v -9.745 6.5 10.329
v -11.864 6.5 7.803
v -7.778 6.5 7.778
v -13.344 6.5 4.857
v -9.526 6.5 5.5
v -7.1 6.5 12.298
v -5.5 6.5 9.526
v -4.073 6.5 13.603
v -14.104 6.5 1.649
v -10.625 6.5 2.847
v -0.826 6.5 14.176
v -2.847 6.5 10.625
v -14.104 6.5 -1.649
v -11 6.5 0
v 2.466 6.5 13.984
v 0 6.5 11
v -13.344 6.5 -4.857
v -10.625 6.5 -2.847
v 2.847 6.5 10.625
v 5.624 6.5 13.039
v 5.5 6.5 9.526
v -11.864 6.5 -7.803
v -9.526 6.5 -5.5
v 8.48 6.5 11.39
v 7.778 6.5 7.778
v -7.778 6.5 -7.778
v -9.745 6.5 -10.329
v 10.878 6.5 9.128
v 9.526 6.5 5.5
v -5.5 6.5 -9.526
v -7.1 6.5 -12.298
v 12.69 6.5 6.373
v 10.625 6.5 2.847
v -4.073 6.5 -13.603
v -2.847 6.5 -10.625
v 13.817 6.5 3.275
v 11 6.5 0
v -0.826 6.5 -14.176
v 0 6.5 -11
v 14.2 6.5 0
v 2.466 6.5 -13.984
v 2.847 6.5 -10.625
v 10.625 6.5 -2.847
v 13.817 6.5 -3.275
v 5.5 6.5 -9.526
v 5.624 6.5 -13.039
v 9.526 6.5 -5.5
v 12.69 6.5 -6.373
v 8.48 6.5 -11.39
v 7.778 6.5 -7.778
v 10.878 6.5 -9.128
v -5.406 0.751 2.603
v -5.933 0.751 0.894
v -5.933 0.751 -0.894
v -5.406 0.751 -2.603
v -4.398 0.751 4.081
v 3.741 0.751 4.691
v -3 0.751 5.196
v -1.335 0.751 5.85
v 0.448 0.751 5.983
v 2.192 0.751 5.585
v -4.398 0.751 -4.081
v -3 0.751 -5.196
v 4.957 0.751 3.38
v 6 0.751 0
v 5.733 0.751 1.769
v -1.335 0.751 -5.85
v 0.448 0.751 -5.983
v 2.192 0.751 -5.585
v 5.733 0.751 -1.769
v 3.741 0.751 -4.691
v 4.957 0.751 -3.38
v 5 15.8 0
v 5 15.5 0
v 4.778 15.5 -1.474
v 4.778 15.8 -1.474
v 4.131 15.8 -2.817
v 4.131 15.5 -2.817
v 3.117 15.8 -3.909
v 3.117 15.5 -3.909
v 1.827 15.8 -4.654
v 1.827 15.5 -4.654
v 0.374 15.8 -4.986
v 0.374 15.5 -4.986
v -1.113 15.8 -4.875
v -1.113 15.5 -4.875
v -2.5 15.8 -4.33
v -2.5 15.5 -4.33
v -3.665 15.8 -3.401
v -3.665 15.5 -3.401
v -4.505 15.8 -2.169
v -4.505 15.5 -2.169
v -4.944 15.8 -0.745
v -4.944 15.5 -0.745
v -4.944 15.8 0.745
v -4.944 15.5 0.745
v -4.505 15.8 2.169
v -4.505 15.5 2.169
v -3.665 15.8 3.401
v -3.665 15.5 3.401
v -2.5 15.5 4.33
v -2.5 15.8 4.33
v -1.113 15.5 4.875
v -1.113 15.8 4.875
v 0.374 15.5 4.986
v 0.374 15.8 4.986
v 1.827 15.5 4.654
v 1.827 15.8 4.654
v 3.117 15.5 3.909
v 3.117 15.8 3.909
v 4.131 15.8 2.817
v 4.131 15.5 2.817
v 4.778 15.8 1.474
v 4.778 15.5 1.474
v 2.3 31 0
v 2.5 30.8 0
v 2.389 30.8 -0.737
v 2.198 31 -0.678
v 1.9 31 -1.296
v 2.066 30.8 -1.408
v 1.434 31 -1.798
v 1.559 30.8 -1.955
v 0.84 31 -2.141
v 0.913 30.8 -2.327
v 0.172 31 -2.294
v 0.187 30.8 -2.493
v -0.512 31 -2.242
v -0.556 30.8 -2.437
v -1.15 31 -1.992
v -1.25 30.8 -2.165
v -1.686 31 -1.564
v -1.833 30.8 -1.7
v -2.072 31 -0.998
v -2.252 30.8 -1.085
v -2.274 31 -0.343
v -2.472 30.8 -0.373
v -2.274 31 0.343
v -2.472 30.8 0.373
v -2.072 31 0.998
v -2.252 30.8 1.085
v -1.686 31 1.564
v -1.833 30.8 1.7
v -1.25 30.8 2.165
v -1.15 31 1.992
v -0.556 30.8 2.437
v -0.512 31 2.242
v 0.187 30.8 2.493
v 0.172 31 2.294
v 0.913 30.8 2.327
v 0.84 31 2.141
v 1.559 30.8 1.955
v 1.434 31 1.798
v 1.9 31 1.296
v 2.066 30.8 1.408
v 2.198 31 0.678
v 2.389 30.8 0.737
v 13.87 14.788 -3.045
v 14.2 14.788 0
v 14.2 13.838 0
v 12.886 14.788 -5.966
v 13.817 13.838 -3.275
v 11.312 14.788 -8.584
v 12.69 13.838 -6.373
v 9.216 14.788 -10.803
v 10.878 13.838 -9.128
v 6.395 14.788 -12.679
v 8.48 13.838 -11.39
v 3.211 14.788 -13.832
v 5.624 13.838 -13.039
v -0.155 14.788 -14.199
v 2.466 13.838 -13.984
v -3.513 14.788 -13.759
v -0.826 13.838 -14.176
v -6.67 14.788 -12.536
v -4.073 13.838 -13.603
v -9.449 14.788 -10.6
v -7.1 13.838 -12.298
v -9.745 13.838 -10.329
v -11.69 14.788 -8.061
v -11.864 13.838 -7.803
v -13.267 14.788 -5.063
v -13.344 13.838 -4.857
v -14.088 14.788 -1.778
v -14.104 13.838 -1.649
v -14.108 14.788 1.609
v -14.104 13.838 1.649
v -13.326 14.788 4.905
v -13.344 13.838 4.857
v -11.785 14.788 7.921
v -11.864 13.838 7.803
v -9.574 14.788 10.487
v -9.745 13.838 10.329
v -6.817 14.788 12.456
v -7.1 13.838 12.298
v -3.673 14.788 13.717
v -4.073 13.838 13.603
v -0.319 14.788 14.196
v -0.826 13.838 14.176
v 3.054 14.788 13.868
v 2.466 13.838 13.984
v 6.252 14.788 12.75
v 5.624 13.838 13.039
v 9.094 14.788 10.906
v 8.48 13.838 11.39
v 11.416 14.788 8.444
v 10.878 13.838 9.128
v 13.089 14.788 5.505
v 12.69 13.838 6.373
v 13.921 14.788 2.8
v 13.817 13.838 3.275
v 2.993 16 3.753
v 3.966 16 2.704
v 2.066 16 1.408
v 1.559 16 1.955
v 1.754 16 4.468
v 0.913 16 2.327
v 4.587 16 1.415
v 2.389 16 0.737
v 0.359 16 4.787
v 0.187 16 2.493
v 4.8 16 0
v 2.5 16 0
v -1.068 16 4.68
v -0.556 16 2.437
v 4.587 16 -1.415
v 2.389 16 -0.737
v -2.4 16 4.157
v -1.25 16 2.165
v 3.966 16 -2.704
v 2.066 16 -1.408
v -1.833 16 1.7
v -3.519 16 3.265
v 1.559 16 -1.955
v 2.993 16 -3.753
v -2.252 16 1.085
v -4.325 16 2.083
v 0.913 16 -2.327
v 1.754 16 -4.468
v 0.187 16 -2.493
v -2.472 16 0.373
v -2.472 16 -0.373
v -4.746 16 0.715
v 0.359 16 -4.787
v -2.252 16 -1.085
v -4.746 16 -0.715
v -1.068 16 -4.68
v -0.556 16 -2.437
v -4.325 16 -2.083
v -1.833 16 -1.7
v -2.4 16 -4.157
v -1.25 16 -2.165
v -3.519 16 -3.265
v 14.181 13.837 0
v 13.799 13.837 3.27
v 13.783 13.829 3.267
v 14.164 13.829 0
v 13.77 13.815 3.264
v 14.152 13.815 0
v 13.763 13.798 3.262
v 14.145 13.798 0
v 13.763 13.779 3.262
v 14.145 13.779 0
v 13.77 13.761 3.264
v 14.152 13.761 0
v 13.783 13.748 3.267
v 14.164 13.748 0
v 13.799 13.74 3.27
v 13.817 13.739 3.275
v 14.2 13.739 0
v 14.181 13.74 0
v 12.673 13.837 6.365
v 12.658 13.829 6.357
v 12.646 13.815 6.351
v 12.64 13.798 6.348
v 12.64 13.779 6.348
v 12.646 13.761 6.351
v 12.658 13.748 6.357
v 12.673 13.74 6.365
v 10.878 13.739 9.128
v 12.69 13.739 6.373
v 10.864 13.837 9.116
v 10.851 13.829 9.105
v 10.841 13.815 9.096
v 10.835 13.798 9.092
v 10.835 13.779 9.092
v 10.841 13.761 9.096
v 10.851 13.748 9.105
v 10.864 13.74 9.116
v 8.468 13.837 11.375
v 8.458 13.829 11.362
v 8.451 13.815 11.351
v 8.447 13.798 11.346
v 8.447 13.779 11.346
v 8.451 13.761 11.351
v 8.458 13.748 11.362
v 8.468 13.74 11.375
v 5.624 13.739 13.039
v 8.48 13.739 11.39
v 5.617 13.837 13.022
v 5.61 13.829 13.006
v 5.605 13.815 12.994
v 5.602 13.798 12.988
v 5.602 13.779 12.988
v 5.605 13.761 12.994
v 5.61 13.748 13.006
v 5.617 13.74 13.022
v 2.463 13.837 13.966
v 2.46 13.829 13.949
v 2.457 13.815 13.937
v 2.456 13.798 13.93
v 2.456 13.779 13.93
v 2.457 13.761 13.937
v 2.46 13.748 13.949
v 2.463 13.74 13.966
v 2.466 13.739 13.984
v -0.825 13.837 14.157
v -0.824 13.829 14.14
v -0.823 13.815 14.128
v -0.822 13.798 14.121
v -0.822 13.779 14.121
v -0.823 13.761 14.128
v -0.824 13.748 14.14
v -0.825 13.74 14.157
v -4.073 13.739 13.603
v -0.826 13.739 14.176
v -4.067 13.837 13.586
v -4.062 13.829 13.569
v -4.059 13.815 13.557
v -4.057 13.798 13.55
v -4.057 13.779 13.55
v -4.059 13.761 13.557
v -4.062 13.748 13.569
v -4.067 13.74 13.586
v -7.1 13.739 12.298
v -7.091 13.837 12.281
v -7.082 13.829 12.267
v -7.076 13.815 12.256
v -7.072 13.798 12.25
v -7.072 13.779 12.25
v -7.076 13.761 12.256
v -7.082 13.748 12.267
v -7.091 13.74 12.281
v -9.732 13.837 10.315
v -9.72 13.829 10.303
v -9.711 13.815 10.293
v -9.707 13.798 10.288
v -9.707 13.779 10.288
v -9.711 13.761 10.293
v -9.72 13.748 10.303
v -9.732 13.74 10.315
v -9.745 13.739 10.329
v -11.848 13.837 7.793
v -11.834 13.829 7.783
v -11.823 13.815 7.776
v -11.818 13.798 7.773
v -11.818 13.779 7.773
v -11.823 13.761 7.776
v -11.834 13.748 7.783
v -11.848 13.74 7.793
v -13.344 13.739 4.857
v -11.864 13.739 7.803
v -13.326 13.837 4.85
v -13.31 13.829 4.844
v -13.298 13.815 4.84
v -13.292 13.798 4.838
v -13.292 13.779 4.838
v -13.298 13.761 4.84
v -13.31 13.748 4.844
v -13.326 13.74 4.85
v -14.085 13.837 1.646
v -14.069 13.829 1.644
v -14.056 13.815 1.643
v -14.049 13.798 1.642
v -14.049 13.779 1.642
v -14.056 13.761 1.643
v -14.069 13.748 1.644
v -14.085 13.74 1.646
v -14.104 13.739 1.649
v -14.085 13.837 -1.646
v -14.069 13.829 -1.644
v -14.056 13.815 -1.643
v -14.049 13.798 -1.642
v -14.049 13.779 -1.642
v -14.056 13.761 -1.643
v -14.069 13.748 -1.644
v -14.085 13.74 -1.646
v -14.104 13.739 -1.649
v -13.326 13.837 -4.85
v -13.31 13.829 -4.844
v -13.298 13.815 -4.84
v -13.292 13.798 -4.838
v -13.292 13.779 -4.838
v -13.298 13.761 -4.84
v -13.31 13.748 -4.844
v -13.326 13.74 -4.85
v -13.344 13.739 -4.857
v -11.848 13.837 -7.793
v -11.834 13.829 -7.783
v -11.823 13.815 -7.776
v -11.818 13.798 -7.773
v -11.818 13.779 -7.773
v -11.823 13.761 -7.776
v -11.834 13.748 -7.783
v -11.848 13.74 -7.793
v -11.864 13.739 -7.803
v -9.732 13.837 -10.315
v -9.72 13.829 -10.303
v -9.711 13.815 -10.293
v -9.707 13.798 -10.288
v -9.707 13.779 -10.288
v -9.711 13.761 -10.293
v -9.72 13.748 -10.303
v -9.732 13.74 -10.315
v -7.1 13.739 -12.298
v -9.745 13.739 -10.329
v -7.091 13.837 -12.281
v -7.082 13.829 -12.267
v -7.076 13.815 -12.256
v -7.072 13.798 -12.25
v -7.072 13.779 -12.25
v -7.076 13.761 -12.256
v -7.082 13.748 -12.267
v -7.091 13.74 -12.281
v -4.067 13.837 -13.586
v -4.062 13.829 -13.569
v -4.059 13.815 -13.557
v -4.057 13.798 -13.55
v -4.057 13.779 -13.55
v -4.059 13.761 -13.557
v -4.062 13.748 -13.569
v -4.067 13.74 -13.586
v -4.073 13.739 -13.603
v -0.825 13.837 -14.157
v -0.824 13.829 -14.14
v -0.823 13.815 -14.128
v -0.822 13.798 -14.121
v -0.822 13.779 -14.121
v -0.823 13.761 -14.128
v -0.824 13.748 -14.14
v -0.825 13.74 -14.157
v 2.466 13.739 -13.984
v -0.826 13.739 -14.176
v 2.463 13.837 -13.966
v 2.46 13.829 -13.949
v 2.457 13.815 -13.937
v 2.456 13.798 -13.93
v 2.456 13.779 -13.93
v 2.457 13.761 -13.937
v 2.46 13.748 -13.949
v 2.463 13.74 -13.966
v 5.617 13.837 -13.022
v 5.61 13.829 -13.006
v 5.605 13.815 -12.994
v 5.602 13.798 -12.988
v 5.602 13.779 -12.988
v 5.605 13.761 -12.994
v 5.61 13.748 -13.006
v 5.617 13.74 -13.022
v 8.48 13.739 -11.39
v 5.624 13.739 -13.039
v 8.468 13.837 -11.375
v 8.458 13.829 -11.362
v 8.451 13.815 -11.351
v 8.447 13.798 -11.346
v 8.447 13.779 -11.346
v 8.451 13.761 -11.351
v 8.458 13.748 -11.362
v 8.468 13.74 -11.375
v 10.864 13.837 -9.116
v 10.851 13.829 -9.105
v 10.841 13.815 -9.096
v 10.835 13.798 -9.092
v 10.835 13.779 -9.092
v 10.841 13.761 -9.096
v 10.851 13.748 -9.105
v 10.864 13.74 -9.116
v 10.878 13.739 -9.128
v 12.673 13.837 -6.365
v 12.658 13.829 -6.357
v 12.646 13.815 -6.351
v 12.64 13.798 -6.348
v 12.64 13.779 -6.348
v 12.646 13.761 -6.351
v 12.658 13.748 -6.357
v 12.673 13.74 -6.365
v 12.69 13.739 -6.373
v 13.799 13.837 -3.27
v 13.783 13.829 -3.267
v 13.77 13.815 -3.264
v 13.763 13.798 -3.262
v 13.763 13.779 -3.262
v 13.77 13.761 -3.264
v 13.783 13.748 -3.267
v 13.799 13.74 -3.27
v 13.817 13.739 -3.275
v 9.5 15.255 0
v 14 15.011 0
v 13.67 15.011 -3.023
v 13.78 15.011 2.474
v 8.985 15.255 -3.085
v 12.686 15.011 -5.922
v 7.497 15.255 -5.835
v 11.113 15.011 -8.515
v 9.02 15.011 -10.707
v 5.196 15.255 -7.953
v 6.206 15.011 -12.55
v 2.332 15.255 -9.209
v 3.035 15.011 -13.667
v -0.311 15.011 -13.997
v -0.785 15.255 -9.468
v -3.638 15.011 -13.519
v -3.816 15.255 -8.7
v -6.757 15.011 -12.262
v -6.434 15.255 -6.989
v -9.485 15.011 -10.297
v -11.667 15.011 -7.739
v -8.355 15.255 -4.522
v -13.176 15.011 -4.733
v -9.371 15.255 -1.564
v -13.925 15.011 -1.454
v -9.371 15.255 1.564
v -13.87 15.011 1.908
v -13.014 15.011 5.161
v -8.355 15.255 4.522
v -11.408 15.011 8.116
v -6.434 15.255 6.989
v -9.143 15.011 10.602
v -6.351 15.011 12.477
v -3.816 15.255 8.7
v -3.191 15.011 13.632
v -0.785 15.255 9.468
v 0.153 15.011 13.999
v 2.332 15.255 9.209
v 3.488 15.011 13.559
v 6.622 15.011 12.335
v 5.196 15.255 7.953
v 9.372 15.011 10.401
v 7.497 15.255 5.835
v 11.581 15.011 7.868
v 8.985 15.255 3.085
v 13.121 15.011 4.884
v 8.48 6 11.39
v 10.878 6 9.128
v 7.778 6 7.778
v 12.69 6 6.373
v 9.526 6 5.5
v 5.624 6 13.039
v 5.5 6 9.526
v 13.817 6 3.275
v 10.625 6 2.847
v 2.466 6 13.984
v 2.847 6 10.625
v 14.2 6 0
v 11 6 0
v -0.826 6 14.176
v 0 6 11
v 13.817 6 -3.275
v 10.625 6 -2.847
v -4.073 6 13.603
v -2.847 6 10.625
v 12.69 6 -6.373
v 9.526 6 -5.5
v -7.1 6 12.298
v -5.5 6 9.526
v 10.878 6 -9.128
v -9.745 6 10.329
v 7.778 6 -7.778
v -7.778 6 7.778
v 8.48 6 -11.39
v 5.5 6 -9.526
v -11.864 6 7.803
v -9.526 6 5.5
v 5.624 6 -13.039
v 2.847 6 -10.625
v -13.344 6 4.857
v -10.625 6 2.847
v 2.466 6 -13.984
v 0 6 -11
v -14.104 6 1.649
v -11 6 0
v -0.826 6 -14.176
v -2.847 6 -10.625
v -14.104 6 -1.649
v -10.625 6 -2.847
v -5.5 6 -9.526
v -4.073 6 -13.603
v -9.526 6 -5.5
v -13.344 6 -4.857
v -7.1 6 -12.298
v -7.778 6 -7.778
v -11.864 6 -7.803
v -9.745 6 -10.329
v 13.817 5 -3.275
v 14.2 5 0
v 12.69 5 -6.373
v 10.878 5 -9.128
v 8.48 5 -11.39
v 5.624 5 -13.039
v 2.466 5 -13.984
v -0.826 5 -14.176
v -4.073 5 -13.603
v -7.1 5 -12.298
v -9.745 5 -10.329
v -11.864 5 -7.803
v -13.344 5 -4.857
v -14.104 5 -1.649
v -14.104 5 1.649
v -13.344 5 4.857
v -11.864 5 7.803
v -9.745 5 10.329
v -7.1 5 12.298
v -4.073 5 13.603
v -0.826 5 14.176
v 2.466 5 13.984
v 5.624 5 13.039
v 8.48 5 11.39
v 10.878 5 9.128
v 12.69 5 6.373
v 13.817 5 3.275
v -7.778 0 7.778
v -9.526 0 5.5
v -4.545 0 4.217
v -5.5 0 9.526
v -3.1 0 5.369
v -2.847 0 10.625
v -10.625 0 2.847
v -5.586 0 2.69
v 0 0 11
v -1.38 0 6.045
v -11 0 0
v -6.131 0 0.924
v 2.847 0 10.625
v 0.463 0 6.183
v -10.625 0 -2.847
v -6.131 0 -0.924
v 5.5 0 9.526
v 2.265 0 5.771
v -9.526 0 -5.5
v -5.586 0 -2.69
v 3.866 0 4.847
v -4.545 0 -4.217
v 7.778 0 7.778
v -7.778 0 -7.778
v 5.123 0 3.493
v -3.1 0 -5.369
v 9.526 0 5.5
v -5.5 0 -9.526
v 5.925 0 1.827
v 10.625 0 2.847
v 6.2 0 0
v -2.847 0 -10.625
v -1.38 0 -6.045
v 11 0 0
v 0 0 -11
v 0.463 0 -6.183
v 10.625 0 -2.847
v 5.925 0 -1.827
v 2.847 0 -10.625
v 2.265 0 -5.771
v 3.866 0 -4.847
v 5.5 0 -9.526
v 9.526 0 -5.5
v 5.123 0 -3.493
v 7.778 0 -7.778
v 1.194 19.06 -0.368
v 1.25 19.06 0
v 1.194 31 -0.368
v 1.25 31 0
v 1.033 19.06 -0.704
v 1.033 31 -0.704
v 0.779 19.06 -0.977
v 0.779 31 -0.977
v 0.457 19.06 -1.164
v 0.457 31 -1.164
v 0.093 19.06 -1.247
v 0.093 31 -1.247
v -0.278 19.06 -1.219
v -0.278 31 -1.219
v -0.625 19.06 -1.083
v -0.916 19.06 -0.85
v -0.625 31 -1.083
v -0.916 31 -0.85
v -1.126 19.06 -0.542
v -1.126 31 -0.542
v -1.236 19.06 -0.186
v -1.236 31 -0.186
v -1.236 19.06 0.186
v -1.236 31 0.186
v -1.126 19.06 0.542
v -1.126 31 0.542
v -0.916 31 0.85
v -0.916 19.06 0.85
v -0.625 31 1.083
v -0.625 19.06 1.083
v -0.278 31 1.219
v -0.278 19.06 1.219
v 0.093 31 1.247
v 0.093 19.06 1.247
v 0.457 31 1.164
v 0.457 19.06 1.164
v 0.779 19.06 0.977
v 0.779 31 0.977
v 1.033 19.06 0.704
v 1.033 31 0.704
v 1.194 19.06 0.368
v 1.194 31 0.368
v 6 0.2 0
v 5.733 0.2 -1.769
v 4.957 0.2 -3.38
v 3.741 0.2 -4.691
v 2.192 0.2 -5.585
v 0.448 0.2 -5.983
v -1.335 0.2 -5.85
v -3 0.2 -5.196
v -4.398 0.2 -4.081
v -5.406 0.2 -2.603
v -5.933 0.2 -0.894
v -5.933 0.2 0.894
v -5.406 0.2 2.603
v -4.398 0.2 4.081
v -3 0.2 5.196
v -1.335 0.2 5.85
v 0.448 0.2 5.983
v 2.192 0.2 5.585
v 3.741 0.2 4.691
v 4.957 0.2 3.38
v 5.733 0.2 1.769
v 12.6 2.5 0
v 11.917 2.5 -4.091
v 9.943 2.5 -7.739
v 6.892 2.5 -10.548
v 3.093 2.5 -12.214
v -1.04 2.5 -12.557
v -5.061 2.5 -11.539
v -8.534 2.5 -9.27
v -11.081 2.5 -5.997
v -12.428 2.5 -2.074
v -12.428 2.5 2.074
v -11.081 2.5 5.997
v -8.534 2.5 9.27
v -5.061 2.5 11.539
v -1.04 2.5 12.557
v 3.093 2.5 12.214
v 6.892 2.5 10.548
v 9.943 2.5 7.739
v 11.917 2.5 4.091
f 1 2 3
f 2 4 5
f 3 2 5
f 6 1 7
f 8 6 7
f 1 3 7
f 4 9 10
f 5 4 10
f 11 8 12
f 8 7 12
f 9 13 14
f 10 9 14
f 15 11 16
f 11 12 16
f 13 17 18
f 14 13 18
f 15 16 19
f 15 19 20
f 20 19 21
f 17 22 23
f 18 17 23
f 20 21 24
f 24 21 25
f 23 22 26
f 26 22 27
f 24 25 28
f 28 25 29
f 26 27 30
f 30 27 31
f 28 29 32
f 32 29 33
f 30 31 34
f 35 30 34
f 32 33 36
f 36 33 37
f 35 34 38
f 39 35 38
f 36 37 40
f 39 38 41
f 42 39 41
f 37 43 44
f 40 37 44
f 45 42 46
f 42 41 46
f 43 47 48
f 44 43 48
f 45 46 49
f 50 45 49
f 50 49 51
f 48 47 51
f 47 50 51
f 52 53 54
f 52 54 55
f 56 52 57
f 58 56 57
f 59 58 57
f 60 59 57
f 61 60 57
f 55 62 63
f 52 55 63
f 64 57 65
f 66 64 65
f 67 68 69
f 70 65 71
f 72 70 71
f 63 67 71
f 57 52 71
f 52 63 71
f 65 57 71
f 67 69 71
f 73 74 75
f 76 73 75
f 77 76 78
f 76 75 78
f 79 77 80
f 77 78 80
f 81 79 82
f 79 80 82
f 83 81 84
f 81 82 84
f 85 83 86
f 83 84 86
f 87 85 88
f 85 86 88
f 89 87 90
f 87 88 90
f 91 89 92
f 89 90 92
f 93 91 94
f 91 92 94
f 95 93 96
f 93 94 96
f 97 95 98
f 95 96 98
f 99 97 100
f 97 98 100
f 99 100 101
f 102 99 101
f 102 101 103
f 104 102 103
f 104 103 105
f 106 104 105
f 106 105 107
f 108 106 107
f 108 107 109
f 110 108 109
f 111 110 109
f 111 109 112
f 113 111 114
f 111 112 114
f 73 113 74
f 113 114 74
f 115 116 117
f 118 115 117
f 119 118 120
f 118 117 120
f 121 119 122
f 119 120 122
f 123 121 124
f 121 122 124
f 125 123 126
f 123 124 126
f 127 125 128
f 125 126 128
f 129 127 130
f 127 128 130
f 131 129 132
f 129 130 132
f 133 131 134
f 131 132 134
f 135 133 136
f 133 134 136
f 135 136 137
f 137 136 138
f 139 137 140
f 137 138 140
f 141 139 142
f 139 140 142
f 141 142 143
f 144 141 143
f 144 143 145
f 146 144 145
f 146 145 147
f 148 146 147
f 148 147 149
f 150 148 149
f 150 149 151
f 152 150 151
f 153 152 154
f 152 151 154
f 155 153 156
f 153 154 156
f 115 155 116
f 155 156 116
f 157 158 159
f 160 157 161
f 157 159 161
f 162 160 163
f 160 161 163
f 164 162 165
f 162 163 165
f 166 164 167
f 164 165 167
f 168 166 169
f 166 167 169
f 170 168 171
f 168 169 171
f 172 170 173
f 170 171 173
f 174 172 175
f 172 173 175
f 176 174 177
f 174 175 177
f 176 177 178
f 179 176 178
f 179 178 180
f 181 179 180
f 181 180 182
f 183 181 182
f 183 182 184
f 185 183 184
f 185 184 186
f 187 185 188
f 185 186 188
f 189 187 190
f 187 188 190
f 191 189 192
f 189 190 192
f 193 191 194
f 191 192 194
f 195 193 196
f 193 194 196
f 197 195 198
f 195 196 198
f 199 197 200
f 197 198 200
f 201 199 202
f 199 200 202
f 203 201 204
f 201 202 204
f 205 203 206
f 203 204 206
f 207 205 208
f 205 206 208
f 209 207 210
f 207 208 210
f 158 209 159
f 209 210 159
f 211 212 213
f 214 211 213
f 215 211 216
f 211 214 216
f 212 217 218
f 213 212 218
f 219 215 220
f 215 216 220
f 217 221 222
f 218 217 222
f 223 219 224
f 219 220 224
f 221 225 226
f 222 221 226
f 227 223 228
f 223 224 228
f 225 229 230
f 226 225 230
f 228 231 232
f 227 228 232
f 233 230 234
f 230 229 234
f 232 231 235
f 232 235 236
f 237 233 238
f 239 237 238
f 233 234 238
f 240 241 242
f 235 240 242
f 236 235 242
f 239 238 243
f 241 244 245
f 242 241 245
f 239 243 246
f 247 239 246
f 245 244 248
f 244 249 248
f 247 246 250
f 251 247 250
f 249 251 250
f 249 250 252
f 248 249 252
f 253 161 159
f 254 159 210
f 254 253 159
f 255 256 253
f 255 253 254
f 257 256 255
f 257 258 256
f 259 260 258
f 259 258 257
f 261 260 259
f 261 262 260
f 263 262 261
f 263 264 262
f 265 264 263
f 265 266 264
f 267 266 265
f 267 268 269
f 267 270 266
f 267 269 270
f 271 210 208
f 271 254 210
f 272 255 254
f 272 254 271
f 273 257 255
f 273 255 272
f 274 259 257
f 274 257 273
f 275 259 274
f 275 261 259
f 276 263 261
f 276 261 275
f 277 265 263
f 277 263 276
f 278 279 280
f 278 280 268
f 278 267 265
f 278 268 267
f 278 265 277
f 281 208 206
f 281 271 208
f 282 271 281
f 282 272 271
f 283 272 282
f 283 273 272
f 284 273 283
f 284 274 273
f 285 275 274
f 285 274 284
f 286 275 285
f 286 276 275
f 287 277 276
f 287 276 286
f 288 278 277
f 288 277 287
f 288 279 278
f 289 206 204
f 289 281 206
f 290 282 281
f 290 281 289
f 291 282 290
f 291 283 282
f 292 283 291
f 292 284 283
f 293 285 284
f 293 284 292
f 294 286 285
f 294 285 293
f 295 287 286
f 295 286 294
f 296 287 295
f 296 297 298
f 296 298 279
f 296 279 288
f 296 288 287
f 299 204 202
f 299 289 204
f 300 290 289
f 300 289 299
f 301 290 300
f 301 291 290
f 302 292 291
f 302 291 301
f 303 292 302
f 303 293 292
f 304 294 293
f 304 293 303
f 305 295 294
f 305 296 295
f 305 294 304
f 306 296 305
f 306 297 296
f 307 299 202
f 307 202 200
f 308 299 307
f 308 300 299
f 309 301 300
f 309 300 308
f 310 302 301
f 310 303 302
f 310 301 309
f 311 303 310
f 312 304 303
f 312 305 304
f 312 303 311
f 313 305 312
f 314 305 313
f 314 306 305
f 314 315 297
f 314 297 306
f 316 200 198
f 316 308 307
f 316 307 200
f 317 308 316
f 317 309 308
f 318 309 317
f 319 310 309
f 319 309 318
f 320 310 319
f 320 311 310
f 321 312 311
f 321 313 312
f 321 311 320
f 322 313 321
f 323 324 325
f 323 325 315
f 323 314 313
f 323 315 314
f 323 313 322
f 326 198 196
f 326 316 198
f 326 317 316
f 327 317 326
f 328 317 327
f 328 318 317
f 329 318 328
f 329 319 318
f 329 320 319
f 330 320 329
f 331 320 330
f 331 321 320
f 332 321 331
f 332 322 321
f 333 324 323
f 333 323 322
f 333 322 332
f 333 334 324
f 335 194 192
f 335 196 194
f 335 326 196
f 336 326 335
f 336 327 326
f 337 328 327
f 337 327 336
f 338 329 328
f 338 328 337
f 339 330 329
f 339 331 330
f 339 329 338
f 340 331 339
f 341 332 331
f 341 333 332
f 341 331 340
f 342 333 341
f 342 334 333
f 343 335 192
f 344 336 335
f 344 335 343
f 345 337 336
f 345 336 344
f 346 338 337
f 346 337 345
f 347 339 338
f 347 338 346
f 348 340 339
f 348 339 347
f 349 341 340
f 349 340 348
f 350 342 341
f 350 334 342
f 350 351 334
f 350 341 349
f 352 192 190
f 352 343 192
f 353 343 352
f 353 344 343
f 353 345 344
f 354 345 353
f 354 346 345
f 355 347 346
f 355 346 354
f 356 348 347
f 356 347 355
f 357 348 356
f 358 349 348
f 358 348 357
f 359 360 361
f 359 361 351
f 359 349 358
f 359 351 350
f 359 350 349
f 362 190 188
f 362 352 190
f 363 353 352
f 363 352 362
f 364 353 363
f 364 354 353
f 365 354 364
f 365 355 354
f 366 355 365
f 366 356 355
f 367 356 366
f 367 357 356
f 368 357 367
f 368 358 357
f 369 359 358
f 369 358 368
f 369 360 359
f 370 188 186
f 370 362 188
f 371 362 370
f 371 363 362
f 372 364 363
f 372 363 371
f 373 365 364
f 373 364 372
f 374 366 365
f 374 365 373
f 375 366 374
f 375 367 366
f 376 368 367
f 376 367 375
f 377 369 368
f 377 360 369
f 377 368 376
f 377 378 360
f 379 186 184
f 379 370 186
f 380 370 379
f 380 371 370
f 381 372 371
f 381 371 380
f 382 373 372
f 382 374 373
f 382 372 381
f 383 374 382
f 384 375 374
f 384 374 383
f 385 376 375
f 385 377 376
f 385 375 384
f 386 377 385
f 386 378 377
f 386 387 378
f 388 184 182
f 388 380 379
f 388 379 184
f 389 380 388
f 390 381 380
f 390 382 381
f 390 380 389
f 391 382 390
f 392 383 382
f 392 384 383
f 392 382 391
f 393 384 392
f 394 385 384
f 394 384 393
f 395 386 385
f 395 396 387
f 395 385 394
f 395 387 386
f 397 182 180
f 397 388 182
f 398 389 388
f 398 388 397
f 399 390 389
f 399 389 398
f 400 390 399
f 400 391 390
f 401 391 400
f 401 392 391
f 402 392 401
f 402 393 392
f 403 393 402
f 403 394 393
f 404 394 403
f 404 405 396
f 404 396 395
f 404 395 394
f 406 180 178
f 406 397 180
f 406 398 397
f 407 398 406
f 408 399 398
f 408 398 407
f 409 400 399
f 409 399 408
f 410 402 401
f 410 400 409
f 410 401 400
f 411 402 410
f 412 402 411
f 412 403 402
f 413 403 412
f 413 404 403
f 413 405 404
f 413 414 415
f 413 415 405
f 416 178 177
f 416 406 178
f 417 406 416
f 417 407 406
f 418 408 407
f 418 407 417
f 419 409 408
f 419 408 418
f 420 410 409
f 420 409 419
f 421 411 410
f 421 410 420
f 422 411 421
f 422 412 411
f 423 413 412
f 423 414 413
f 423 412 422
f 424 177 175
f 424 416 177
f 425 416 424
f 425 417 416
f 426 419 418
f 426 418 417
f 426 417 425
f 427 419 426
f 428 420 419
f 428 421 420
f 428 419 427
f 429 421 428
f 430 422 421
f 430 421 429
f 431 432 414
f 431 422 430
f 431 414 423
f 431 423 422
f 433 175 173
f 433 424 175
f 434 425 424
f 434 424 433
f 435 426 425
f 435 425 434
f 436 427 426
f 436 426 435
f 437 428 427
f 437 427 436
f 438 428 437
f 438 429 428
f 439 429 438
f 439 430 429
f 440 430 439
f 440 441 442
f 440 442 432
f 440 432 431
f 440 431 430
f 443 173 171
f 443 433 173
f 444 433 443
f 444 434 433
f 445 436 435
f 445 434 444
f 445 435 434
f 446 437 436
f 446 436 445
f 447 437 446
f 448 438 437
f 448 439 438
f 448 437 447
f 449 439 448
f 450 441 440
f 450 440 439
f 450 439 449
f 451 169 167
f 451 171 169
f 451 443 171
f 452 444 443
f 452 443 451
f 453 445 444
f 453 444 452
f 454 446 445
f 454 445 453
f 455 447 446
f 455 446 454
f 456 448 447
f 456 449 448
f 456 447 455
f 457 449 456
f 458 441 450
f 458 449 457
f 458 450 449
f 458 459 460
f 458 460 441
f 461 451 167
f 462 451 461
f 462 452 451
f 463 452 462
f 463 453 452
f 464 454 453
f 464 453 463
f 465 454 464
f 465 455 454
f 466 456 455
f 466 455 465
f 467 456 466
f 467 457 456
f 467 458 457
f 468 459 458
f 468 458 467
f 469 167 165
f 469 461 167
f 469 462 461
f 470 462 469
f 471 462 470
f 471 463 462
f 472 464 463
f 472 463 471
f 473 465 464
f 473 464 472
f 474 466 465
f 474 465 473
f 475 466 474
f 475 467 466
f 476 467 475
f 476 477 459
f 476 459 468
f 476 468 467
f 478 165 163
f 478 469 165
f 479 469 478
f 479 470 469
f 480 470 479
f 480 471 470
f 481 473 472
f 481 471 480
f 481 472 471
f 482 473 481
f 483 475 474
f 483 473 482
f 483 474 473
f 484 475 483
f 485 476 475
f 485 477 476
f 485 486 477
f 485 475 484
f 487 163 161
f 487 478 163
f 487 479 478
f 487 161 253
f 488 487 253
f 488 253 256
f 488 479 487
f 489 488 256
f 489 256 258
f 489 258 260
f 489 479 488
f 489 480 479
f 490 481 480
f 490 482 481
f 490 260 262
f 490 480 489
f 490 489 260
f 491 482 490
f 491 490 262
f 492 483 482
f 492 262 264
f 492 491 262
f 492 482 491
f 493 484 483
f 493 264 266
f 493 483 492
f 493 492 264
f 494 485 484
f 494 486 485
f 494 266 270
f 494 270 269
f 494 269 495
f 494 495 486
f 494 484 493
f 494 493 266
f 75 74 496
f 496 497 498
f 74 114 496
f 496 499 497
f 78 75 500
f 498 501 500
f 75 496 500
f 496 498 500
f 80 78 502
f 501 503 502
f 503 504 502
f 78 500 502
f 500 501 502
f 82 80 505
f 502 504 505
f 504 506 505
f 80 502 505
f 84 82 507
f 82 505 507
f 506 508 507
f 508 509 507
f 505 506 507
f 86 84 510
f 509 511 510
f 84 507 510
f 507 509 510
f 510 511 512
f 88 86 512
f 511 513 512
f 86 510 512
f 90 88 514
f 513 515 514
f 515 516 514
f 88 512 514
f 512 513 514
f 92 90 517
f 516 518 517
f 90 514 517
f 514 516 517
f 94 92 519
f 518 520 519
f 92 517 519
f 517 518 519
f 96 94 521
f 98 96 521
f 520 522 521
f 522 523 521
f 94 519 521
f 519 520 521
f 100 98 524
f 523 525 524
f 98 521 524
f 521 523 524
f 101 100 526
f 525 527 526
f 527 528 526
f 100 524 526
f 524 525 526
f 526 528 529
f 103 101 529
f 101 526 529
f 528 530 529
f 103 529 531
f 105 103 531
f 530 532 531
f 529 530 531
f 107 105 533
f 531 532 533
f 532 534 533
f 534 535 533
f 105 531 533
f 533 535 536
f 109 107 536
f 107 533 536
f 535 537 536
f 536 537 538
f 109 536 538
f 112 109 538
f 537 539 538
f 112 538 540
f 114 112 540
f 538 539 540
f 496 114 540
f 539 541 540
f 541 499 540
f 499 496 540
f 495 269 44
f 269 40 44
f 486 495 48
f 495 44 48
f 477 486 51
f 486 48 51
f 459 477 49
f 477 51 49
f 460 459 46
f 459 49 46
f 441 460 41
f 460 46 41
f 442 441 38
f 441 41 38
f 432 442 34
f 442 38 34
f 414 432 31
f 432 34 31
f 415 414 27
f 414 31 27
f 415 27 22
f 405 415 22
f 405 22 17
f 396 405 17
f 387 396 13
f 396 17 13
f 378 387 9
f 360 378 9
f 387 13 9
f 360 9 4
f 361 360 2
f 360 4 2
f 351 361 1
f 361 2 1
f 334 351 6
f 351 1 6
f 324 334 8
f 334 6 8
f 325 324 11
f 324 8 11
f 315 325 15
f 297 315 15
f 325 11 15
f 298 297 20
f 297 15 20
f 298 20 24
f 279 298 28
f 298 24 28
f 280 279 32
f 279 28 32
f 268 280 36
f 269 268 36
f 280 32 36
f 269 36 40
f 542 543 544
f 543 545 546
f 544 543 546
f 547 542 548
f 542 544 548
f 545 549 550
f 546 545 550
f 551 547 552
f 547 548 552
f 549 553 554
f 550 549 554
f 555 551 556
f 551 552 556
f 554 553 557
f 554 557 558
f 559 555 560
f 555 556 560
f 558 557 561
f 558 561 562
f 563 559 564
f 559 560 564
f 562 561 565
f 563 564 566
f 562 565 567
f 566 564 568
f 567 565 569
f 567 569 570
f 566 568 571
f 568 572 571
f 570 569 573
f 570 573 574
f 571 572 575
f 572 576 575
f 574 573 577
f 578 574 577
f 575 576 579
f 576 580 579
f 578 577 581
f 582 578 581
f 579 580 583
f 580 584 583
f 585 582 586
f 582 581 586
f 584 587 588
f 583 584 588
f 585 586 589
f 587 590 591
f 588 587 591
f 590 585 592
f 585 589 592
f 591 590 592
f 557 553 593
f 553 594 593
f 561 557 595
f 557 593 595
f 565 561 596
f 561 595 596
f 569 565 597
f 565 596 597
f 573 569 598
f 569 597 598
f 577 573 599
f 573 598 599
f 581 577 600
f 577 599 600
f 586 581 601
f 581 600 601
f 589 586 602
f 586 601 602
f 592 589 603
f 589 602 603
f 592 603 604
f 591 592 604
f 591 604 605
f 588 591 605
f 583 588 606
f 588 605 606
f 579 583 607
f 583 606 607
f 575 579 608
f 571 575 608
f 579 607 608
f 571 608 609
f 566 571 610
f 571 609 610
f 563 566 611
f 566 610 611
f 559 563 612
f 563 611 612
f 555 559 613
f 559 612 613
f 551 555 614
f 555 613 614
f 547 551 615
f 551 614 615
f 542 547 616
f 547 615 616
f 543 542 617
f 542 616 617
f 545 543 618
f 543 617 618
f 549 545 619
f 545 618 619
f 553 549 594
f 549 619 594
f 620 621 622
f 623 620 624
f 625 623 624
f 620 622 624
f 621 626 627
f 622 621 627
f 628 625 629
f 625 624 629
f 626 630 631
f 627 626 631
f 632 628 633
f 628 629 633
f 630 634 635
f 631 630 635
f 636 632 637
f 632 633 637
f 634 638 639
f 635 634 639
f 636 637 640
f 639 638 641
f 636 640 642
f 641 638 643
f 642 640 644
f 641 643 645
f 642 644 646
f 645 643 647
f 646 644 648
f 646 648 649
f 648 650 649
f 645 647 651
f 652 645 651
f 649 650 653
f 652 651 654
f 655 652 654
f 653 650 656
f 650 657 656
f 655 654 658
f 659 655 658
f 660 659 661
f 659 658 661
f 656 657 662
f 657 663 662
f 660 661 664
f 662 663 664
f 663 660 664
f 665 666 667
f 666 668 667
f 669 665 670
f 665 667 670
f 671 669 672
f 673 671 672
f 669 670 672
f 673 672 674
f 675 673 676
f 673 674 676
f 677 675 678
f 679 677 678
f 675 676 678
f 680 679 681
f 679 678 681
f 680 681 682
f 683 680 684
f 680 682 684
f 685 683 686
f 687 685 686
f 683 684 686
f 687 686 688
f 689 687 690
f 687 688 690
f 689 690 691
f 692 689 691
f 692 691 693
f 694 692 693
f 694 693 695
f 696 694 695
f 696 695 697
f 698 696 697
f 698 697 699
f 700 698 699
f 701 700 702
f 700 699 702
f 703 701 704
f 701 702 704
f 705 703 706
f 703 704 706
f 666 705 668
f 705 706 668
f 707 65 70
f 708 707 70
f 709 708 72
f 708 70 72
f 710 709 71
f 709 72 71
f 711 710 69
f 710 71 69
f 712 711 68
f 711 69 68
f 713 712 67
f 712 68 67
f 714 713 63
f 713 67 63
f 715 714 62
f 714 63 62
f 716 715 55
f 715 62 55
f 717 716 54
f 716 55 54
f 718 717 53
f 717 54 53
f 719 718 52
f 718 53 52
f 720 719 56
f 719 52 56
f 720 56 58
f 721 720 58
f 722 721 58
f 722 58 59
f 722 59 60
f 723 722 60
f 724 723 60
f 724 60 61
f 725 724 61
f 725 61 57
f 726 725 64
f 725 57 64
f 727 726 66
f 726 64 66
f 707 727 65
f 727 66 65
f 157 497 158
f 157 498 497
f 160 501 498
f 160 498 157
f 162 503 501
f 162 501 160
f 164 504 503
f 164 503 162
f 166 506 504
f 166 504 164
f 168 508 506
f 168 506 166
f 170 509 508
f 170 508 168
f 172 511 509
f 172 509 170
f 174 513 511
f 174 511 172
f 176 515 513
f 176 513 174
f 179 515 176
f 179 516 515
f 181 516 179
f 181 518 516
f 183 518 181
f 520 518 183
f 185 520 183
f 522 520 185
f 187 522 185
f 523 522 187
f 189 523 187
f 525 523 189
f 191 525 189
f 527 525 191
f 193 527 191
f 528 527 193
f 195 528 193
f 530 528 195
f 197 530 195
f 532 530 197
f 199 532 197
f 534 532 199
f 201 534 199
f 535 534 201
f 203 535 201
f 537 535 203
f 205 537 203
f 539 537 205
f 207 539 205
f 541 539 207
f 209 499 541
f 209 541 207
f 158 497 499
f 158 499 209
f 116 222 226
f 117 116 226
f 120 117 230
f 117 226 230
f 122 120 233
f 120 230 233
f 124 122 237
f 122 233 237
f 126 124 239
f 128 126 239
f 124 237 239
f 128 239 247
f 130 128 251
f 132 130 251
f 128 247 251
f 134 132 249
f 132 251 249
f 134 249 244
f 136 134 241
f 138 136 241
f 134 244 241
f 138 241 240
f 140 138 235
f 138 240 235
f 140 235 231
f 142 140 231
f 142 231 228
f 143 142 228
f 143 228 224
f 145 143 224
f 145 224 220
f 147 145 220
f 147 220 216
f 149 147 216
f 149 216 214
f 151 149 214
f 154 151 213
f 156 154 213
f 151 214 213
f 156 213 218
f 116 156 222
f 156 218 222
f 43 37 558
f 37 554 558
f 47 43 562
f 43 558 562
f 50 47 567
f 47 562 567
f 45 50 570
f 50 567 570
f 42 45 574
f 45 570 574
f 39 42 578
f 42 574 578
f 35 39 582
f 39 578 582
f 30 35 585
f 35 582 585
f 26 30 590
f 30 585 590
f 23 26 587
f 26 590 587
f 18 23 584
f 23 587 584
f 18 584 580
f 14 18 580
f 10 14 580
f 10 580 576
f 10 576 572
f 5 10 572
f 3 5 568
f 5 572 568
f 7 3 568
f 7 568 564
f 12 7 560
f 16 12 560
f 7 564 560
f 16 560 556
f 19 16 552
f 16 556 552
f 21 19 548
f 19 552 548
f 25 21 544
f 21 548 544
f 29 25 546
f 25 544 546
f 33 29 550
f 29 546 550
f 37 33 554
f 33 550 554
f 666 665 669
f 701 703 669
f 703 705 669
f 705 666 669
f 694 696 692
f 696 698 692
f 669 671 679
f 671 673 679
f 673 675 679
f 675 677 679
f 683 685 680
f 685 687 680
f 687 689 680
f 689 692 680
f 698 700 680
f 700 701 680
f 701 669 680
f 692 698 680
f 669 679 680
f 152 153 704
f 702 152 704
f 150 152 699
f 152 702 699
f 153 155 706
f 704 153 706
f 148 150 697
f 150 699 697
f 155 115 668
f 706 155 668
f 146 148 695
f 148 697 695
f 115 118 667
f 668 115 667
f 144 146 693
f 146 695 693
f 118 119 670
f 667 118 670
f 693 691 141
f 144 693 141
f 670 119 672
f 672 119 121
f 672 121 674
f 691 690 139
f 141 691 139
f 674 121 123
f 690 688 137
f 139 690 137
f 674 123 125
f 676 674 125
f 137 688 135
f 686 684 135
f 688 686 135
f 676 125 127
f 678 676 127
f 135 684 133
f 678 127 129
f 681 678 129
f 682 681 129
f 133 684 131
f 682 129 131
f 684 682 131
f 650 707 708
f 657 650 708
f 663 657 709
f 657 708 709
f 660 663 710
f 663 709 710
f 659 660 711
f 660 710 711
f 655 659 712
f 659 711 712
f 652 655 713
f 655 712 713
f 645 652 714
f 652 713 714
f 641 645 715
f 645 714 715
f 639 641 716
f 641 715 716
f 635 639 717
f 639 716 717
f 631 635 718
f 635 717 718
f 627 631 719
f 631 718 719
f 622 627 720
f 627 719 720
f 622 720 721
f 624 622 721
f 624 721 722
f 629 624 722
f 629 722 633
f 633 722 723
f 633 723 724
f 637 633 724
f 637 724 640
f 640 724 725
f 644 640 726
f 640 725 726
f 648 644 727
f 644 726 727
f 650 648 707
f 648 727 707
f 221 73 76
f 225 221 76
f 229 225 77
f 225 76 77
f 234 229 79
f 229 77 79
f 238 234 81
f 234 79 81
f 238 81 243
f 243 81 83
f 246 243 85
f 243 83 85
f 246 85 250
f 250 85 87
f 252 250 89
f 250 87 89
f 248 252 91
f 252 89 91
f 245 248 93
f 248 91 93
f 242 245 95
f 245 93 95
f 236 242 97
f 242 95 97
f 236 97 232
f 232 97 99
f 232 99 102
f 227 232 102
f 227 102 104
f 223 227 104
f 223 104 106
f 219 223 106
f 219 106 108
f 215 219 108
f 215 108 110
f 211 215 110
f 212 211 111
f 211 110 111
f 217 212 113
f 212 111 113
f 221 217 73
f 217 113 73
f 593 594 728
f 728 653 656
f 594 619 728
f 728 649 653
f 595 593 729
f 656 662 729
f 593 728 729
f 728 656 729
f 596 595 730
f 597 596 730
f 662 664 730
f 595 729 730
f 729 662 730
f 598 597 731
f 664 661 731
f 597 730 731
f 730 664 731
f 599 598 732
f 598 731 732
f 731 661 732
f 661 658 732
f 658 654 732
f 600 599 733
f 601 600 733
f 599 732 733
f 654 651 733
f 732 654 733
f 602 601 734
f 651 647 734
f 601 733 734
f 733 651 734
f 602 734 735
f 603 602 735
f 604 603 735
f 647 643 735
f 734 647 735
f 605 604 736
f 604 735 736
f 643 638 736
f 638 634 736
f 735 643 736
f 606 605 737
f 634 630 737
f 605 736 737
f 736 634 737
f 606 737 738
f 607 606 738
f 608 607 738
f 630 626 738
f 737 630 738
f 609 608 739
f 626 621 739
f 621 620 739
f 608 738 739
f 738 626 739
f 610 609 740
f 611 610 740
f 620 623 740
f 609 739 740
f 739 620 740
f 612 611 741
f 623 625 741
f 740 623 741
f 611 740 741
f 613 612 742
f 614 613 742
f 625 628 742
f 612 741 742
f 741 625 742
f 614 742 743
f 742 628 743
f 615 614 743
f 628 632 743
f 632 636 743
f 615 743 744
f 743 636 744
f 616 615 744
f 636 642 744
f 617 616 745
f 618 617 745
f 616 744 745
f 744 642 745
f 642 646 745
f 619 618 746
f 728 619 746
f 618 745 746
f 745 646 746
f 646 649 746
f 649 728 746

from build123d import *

# Parameters (mm, degrees)
CHAMFER_1_SIZE         = 0.2
CHAMFER_1_EDGE_2_SIZE  = 0.2
CHAMFER_1_EDGE_3_SIZE2 = 0.211806366
CHAMFER_1_EDGE_3_SIZE  = 0.2
CHAMFER_1_EDGE_4_SIZE  = 0.2
SKETCH_4_R             = 0.05


with BuildPart() as part:
    # 草图1 → 旋转1 (revolve)
    with BuildSketch(Plane.XY):
        Polygon((0, 0.750762333), (0, 19.059798334), (1.25, 19.059798334), (1.25, 31), (2.5, 31), (2.5, 16), (5, 16), (5, 15.5), (14.2, 15), (14.2, 6.5), (11, 6.5), (11, 6), (14.2, 6), (14.2, 5), (11, 0), (6, 0), (6, 0.750762333), align=None)
    revolve(axis=Axis((0, 0.750762333, 0), (0, 1, 0)))

    # 倒角1
    chamfer_1_edges = [part.edges().sort_by_distance(p)[0] for p in [
        (-2.5, 31, 0),
    ]]
    chamfer(chamfer_1_edges, length=CHAMFER_1_SIZE)

    # 倒角1 edge 2
    chamfer_1_edge_2_edges = [part.edges().sort_by_distance(p)[0] for p in [
        (-5, 16, 0),
    ]]
    chamfer(chamfer_1_edge_2_edges, length=CHAMFER_1_EDGE_2_SIZE)

    # 倒角1 edge 3
    chamfer_1_edge_3_edges = [part.edges().sort_by_distance(p)[0] for p in [
        (-14.2, 15, 0),
    ]]
    chamfer(chamfer_1_edge_3_edges, length=CHAMFER_1_EDGE_3_SIZE, length2=CHAMFER_1_EDGE_3_SIZE2)

    # 倒角1 edge 4
    chamfer_1_edge_4_edges = [part.edges().sort_by_distance(p)[0] for p in [
        (-6, 0, 0),
    ]]
    chamfer(chamfer_1_edge_4_edges, length=CHAMFER_1_EDGE_4_SIZE)

    # 草图4 → 切除-旋转4 (revolve, cut)
    with BuildSketch(Plane.XY):
        with Locations((14.193753357, 13.788193634)):
            Circle(SKETCH_4_R)
    revolve(axis=Axis((0, 32.55, 0), (0, -1, 0)), mode=Mode.SUBTRACT)


solid = part.part
